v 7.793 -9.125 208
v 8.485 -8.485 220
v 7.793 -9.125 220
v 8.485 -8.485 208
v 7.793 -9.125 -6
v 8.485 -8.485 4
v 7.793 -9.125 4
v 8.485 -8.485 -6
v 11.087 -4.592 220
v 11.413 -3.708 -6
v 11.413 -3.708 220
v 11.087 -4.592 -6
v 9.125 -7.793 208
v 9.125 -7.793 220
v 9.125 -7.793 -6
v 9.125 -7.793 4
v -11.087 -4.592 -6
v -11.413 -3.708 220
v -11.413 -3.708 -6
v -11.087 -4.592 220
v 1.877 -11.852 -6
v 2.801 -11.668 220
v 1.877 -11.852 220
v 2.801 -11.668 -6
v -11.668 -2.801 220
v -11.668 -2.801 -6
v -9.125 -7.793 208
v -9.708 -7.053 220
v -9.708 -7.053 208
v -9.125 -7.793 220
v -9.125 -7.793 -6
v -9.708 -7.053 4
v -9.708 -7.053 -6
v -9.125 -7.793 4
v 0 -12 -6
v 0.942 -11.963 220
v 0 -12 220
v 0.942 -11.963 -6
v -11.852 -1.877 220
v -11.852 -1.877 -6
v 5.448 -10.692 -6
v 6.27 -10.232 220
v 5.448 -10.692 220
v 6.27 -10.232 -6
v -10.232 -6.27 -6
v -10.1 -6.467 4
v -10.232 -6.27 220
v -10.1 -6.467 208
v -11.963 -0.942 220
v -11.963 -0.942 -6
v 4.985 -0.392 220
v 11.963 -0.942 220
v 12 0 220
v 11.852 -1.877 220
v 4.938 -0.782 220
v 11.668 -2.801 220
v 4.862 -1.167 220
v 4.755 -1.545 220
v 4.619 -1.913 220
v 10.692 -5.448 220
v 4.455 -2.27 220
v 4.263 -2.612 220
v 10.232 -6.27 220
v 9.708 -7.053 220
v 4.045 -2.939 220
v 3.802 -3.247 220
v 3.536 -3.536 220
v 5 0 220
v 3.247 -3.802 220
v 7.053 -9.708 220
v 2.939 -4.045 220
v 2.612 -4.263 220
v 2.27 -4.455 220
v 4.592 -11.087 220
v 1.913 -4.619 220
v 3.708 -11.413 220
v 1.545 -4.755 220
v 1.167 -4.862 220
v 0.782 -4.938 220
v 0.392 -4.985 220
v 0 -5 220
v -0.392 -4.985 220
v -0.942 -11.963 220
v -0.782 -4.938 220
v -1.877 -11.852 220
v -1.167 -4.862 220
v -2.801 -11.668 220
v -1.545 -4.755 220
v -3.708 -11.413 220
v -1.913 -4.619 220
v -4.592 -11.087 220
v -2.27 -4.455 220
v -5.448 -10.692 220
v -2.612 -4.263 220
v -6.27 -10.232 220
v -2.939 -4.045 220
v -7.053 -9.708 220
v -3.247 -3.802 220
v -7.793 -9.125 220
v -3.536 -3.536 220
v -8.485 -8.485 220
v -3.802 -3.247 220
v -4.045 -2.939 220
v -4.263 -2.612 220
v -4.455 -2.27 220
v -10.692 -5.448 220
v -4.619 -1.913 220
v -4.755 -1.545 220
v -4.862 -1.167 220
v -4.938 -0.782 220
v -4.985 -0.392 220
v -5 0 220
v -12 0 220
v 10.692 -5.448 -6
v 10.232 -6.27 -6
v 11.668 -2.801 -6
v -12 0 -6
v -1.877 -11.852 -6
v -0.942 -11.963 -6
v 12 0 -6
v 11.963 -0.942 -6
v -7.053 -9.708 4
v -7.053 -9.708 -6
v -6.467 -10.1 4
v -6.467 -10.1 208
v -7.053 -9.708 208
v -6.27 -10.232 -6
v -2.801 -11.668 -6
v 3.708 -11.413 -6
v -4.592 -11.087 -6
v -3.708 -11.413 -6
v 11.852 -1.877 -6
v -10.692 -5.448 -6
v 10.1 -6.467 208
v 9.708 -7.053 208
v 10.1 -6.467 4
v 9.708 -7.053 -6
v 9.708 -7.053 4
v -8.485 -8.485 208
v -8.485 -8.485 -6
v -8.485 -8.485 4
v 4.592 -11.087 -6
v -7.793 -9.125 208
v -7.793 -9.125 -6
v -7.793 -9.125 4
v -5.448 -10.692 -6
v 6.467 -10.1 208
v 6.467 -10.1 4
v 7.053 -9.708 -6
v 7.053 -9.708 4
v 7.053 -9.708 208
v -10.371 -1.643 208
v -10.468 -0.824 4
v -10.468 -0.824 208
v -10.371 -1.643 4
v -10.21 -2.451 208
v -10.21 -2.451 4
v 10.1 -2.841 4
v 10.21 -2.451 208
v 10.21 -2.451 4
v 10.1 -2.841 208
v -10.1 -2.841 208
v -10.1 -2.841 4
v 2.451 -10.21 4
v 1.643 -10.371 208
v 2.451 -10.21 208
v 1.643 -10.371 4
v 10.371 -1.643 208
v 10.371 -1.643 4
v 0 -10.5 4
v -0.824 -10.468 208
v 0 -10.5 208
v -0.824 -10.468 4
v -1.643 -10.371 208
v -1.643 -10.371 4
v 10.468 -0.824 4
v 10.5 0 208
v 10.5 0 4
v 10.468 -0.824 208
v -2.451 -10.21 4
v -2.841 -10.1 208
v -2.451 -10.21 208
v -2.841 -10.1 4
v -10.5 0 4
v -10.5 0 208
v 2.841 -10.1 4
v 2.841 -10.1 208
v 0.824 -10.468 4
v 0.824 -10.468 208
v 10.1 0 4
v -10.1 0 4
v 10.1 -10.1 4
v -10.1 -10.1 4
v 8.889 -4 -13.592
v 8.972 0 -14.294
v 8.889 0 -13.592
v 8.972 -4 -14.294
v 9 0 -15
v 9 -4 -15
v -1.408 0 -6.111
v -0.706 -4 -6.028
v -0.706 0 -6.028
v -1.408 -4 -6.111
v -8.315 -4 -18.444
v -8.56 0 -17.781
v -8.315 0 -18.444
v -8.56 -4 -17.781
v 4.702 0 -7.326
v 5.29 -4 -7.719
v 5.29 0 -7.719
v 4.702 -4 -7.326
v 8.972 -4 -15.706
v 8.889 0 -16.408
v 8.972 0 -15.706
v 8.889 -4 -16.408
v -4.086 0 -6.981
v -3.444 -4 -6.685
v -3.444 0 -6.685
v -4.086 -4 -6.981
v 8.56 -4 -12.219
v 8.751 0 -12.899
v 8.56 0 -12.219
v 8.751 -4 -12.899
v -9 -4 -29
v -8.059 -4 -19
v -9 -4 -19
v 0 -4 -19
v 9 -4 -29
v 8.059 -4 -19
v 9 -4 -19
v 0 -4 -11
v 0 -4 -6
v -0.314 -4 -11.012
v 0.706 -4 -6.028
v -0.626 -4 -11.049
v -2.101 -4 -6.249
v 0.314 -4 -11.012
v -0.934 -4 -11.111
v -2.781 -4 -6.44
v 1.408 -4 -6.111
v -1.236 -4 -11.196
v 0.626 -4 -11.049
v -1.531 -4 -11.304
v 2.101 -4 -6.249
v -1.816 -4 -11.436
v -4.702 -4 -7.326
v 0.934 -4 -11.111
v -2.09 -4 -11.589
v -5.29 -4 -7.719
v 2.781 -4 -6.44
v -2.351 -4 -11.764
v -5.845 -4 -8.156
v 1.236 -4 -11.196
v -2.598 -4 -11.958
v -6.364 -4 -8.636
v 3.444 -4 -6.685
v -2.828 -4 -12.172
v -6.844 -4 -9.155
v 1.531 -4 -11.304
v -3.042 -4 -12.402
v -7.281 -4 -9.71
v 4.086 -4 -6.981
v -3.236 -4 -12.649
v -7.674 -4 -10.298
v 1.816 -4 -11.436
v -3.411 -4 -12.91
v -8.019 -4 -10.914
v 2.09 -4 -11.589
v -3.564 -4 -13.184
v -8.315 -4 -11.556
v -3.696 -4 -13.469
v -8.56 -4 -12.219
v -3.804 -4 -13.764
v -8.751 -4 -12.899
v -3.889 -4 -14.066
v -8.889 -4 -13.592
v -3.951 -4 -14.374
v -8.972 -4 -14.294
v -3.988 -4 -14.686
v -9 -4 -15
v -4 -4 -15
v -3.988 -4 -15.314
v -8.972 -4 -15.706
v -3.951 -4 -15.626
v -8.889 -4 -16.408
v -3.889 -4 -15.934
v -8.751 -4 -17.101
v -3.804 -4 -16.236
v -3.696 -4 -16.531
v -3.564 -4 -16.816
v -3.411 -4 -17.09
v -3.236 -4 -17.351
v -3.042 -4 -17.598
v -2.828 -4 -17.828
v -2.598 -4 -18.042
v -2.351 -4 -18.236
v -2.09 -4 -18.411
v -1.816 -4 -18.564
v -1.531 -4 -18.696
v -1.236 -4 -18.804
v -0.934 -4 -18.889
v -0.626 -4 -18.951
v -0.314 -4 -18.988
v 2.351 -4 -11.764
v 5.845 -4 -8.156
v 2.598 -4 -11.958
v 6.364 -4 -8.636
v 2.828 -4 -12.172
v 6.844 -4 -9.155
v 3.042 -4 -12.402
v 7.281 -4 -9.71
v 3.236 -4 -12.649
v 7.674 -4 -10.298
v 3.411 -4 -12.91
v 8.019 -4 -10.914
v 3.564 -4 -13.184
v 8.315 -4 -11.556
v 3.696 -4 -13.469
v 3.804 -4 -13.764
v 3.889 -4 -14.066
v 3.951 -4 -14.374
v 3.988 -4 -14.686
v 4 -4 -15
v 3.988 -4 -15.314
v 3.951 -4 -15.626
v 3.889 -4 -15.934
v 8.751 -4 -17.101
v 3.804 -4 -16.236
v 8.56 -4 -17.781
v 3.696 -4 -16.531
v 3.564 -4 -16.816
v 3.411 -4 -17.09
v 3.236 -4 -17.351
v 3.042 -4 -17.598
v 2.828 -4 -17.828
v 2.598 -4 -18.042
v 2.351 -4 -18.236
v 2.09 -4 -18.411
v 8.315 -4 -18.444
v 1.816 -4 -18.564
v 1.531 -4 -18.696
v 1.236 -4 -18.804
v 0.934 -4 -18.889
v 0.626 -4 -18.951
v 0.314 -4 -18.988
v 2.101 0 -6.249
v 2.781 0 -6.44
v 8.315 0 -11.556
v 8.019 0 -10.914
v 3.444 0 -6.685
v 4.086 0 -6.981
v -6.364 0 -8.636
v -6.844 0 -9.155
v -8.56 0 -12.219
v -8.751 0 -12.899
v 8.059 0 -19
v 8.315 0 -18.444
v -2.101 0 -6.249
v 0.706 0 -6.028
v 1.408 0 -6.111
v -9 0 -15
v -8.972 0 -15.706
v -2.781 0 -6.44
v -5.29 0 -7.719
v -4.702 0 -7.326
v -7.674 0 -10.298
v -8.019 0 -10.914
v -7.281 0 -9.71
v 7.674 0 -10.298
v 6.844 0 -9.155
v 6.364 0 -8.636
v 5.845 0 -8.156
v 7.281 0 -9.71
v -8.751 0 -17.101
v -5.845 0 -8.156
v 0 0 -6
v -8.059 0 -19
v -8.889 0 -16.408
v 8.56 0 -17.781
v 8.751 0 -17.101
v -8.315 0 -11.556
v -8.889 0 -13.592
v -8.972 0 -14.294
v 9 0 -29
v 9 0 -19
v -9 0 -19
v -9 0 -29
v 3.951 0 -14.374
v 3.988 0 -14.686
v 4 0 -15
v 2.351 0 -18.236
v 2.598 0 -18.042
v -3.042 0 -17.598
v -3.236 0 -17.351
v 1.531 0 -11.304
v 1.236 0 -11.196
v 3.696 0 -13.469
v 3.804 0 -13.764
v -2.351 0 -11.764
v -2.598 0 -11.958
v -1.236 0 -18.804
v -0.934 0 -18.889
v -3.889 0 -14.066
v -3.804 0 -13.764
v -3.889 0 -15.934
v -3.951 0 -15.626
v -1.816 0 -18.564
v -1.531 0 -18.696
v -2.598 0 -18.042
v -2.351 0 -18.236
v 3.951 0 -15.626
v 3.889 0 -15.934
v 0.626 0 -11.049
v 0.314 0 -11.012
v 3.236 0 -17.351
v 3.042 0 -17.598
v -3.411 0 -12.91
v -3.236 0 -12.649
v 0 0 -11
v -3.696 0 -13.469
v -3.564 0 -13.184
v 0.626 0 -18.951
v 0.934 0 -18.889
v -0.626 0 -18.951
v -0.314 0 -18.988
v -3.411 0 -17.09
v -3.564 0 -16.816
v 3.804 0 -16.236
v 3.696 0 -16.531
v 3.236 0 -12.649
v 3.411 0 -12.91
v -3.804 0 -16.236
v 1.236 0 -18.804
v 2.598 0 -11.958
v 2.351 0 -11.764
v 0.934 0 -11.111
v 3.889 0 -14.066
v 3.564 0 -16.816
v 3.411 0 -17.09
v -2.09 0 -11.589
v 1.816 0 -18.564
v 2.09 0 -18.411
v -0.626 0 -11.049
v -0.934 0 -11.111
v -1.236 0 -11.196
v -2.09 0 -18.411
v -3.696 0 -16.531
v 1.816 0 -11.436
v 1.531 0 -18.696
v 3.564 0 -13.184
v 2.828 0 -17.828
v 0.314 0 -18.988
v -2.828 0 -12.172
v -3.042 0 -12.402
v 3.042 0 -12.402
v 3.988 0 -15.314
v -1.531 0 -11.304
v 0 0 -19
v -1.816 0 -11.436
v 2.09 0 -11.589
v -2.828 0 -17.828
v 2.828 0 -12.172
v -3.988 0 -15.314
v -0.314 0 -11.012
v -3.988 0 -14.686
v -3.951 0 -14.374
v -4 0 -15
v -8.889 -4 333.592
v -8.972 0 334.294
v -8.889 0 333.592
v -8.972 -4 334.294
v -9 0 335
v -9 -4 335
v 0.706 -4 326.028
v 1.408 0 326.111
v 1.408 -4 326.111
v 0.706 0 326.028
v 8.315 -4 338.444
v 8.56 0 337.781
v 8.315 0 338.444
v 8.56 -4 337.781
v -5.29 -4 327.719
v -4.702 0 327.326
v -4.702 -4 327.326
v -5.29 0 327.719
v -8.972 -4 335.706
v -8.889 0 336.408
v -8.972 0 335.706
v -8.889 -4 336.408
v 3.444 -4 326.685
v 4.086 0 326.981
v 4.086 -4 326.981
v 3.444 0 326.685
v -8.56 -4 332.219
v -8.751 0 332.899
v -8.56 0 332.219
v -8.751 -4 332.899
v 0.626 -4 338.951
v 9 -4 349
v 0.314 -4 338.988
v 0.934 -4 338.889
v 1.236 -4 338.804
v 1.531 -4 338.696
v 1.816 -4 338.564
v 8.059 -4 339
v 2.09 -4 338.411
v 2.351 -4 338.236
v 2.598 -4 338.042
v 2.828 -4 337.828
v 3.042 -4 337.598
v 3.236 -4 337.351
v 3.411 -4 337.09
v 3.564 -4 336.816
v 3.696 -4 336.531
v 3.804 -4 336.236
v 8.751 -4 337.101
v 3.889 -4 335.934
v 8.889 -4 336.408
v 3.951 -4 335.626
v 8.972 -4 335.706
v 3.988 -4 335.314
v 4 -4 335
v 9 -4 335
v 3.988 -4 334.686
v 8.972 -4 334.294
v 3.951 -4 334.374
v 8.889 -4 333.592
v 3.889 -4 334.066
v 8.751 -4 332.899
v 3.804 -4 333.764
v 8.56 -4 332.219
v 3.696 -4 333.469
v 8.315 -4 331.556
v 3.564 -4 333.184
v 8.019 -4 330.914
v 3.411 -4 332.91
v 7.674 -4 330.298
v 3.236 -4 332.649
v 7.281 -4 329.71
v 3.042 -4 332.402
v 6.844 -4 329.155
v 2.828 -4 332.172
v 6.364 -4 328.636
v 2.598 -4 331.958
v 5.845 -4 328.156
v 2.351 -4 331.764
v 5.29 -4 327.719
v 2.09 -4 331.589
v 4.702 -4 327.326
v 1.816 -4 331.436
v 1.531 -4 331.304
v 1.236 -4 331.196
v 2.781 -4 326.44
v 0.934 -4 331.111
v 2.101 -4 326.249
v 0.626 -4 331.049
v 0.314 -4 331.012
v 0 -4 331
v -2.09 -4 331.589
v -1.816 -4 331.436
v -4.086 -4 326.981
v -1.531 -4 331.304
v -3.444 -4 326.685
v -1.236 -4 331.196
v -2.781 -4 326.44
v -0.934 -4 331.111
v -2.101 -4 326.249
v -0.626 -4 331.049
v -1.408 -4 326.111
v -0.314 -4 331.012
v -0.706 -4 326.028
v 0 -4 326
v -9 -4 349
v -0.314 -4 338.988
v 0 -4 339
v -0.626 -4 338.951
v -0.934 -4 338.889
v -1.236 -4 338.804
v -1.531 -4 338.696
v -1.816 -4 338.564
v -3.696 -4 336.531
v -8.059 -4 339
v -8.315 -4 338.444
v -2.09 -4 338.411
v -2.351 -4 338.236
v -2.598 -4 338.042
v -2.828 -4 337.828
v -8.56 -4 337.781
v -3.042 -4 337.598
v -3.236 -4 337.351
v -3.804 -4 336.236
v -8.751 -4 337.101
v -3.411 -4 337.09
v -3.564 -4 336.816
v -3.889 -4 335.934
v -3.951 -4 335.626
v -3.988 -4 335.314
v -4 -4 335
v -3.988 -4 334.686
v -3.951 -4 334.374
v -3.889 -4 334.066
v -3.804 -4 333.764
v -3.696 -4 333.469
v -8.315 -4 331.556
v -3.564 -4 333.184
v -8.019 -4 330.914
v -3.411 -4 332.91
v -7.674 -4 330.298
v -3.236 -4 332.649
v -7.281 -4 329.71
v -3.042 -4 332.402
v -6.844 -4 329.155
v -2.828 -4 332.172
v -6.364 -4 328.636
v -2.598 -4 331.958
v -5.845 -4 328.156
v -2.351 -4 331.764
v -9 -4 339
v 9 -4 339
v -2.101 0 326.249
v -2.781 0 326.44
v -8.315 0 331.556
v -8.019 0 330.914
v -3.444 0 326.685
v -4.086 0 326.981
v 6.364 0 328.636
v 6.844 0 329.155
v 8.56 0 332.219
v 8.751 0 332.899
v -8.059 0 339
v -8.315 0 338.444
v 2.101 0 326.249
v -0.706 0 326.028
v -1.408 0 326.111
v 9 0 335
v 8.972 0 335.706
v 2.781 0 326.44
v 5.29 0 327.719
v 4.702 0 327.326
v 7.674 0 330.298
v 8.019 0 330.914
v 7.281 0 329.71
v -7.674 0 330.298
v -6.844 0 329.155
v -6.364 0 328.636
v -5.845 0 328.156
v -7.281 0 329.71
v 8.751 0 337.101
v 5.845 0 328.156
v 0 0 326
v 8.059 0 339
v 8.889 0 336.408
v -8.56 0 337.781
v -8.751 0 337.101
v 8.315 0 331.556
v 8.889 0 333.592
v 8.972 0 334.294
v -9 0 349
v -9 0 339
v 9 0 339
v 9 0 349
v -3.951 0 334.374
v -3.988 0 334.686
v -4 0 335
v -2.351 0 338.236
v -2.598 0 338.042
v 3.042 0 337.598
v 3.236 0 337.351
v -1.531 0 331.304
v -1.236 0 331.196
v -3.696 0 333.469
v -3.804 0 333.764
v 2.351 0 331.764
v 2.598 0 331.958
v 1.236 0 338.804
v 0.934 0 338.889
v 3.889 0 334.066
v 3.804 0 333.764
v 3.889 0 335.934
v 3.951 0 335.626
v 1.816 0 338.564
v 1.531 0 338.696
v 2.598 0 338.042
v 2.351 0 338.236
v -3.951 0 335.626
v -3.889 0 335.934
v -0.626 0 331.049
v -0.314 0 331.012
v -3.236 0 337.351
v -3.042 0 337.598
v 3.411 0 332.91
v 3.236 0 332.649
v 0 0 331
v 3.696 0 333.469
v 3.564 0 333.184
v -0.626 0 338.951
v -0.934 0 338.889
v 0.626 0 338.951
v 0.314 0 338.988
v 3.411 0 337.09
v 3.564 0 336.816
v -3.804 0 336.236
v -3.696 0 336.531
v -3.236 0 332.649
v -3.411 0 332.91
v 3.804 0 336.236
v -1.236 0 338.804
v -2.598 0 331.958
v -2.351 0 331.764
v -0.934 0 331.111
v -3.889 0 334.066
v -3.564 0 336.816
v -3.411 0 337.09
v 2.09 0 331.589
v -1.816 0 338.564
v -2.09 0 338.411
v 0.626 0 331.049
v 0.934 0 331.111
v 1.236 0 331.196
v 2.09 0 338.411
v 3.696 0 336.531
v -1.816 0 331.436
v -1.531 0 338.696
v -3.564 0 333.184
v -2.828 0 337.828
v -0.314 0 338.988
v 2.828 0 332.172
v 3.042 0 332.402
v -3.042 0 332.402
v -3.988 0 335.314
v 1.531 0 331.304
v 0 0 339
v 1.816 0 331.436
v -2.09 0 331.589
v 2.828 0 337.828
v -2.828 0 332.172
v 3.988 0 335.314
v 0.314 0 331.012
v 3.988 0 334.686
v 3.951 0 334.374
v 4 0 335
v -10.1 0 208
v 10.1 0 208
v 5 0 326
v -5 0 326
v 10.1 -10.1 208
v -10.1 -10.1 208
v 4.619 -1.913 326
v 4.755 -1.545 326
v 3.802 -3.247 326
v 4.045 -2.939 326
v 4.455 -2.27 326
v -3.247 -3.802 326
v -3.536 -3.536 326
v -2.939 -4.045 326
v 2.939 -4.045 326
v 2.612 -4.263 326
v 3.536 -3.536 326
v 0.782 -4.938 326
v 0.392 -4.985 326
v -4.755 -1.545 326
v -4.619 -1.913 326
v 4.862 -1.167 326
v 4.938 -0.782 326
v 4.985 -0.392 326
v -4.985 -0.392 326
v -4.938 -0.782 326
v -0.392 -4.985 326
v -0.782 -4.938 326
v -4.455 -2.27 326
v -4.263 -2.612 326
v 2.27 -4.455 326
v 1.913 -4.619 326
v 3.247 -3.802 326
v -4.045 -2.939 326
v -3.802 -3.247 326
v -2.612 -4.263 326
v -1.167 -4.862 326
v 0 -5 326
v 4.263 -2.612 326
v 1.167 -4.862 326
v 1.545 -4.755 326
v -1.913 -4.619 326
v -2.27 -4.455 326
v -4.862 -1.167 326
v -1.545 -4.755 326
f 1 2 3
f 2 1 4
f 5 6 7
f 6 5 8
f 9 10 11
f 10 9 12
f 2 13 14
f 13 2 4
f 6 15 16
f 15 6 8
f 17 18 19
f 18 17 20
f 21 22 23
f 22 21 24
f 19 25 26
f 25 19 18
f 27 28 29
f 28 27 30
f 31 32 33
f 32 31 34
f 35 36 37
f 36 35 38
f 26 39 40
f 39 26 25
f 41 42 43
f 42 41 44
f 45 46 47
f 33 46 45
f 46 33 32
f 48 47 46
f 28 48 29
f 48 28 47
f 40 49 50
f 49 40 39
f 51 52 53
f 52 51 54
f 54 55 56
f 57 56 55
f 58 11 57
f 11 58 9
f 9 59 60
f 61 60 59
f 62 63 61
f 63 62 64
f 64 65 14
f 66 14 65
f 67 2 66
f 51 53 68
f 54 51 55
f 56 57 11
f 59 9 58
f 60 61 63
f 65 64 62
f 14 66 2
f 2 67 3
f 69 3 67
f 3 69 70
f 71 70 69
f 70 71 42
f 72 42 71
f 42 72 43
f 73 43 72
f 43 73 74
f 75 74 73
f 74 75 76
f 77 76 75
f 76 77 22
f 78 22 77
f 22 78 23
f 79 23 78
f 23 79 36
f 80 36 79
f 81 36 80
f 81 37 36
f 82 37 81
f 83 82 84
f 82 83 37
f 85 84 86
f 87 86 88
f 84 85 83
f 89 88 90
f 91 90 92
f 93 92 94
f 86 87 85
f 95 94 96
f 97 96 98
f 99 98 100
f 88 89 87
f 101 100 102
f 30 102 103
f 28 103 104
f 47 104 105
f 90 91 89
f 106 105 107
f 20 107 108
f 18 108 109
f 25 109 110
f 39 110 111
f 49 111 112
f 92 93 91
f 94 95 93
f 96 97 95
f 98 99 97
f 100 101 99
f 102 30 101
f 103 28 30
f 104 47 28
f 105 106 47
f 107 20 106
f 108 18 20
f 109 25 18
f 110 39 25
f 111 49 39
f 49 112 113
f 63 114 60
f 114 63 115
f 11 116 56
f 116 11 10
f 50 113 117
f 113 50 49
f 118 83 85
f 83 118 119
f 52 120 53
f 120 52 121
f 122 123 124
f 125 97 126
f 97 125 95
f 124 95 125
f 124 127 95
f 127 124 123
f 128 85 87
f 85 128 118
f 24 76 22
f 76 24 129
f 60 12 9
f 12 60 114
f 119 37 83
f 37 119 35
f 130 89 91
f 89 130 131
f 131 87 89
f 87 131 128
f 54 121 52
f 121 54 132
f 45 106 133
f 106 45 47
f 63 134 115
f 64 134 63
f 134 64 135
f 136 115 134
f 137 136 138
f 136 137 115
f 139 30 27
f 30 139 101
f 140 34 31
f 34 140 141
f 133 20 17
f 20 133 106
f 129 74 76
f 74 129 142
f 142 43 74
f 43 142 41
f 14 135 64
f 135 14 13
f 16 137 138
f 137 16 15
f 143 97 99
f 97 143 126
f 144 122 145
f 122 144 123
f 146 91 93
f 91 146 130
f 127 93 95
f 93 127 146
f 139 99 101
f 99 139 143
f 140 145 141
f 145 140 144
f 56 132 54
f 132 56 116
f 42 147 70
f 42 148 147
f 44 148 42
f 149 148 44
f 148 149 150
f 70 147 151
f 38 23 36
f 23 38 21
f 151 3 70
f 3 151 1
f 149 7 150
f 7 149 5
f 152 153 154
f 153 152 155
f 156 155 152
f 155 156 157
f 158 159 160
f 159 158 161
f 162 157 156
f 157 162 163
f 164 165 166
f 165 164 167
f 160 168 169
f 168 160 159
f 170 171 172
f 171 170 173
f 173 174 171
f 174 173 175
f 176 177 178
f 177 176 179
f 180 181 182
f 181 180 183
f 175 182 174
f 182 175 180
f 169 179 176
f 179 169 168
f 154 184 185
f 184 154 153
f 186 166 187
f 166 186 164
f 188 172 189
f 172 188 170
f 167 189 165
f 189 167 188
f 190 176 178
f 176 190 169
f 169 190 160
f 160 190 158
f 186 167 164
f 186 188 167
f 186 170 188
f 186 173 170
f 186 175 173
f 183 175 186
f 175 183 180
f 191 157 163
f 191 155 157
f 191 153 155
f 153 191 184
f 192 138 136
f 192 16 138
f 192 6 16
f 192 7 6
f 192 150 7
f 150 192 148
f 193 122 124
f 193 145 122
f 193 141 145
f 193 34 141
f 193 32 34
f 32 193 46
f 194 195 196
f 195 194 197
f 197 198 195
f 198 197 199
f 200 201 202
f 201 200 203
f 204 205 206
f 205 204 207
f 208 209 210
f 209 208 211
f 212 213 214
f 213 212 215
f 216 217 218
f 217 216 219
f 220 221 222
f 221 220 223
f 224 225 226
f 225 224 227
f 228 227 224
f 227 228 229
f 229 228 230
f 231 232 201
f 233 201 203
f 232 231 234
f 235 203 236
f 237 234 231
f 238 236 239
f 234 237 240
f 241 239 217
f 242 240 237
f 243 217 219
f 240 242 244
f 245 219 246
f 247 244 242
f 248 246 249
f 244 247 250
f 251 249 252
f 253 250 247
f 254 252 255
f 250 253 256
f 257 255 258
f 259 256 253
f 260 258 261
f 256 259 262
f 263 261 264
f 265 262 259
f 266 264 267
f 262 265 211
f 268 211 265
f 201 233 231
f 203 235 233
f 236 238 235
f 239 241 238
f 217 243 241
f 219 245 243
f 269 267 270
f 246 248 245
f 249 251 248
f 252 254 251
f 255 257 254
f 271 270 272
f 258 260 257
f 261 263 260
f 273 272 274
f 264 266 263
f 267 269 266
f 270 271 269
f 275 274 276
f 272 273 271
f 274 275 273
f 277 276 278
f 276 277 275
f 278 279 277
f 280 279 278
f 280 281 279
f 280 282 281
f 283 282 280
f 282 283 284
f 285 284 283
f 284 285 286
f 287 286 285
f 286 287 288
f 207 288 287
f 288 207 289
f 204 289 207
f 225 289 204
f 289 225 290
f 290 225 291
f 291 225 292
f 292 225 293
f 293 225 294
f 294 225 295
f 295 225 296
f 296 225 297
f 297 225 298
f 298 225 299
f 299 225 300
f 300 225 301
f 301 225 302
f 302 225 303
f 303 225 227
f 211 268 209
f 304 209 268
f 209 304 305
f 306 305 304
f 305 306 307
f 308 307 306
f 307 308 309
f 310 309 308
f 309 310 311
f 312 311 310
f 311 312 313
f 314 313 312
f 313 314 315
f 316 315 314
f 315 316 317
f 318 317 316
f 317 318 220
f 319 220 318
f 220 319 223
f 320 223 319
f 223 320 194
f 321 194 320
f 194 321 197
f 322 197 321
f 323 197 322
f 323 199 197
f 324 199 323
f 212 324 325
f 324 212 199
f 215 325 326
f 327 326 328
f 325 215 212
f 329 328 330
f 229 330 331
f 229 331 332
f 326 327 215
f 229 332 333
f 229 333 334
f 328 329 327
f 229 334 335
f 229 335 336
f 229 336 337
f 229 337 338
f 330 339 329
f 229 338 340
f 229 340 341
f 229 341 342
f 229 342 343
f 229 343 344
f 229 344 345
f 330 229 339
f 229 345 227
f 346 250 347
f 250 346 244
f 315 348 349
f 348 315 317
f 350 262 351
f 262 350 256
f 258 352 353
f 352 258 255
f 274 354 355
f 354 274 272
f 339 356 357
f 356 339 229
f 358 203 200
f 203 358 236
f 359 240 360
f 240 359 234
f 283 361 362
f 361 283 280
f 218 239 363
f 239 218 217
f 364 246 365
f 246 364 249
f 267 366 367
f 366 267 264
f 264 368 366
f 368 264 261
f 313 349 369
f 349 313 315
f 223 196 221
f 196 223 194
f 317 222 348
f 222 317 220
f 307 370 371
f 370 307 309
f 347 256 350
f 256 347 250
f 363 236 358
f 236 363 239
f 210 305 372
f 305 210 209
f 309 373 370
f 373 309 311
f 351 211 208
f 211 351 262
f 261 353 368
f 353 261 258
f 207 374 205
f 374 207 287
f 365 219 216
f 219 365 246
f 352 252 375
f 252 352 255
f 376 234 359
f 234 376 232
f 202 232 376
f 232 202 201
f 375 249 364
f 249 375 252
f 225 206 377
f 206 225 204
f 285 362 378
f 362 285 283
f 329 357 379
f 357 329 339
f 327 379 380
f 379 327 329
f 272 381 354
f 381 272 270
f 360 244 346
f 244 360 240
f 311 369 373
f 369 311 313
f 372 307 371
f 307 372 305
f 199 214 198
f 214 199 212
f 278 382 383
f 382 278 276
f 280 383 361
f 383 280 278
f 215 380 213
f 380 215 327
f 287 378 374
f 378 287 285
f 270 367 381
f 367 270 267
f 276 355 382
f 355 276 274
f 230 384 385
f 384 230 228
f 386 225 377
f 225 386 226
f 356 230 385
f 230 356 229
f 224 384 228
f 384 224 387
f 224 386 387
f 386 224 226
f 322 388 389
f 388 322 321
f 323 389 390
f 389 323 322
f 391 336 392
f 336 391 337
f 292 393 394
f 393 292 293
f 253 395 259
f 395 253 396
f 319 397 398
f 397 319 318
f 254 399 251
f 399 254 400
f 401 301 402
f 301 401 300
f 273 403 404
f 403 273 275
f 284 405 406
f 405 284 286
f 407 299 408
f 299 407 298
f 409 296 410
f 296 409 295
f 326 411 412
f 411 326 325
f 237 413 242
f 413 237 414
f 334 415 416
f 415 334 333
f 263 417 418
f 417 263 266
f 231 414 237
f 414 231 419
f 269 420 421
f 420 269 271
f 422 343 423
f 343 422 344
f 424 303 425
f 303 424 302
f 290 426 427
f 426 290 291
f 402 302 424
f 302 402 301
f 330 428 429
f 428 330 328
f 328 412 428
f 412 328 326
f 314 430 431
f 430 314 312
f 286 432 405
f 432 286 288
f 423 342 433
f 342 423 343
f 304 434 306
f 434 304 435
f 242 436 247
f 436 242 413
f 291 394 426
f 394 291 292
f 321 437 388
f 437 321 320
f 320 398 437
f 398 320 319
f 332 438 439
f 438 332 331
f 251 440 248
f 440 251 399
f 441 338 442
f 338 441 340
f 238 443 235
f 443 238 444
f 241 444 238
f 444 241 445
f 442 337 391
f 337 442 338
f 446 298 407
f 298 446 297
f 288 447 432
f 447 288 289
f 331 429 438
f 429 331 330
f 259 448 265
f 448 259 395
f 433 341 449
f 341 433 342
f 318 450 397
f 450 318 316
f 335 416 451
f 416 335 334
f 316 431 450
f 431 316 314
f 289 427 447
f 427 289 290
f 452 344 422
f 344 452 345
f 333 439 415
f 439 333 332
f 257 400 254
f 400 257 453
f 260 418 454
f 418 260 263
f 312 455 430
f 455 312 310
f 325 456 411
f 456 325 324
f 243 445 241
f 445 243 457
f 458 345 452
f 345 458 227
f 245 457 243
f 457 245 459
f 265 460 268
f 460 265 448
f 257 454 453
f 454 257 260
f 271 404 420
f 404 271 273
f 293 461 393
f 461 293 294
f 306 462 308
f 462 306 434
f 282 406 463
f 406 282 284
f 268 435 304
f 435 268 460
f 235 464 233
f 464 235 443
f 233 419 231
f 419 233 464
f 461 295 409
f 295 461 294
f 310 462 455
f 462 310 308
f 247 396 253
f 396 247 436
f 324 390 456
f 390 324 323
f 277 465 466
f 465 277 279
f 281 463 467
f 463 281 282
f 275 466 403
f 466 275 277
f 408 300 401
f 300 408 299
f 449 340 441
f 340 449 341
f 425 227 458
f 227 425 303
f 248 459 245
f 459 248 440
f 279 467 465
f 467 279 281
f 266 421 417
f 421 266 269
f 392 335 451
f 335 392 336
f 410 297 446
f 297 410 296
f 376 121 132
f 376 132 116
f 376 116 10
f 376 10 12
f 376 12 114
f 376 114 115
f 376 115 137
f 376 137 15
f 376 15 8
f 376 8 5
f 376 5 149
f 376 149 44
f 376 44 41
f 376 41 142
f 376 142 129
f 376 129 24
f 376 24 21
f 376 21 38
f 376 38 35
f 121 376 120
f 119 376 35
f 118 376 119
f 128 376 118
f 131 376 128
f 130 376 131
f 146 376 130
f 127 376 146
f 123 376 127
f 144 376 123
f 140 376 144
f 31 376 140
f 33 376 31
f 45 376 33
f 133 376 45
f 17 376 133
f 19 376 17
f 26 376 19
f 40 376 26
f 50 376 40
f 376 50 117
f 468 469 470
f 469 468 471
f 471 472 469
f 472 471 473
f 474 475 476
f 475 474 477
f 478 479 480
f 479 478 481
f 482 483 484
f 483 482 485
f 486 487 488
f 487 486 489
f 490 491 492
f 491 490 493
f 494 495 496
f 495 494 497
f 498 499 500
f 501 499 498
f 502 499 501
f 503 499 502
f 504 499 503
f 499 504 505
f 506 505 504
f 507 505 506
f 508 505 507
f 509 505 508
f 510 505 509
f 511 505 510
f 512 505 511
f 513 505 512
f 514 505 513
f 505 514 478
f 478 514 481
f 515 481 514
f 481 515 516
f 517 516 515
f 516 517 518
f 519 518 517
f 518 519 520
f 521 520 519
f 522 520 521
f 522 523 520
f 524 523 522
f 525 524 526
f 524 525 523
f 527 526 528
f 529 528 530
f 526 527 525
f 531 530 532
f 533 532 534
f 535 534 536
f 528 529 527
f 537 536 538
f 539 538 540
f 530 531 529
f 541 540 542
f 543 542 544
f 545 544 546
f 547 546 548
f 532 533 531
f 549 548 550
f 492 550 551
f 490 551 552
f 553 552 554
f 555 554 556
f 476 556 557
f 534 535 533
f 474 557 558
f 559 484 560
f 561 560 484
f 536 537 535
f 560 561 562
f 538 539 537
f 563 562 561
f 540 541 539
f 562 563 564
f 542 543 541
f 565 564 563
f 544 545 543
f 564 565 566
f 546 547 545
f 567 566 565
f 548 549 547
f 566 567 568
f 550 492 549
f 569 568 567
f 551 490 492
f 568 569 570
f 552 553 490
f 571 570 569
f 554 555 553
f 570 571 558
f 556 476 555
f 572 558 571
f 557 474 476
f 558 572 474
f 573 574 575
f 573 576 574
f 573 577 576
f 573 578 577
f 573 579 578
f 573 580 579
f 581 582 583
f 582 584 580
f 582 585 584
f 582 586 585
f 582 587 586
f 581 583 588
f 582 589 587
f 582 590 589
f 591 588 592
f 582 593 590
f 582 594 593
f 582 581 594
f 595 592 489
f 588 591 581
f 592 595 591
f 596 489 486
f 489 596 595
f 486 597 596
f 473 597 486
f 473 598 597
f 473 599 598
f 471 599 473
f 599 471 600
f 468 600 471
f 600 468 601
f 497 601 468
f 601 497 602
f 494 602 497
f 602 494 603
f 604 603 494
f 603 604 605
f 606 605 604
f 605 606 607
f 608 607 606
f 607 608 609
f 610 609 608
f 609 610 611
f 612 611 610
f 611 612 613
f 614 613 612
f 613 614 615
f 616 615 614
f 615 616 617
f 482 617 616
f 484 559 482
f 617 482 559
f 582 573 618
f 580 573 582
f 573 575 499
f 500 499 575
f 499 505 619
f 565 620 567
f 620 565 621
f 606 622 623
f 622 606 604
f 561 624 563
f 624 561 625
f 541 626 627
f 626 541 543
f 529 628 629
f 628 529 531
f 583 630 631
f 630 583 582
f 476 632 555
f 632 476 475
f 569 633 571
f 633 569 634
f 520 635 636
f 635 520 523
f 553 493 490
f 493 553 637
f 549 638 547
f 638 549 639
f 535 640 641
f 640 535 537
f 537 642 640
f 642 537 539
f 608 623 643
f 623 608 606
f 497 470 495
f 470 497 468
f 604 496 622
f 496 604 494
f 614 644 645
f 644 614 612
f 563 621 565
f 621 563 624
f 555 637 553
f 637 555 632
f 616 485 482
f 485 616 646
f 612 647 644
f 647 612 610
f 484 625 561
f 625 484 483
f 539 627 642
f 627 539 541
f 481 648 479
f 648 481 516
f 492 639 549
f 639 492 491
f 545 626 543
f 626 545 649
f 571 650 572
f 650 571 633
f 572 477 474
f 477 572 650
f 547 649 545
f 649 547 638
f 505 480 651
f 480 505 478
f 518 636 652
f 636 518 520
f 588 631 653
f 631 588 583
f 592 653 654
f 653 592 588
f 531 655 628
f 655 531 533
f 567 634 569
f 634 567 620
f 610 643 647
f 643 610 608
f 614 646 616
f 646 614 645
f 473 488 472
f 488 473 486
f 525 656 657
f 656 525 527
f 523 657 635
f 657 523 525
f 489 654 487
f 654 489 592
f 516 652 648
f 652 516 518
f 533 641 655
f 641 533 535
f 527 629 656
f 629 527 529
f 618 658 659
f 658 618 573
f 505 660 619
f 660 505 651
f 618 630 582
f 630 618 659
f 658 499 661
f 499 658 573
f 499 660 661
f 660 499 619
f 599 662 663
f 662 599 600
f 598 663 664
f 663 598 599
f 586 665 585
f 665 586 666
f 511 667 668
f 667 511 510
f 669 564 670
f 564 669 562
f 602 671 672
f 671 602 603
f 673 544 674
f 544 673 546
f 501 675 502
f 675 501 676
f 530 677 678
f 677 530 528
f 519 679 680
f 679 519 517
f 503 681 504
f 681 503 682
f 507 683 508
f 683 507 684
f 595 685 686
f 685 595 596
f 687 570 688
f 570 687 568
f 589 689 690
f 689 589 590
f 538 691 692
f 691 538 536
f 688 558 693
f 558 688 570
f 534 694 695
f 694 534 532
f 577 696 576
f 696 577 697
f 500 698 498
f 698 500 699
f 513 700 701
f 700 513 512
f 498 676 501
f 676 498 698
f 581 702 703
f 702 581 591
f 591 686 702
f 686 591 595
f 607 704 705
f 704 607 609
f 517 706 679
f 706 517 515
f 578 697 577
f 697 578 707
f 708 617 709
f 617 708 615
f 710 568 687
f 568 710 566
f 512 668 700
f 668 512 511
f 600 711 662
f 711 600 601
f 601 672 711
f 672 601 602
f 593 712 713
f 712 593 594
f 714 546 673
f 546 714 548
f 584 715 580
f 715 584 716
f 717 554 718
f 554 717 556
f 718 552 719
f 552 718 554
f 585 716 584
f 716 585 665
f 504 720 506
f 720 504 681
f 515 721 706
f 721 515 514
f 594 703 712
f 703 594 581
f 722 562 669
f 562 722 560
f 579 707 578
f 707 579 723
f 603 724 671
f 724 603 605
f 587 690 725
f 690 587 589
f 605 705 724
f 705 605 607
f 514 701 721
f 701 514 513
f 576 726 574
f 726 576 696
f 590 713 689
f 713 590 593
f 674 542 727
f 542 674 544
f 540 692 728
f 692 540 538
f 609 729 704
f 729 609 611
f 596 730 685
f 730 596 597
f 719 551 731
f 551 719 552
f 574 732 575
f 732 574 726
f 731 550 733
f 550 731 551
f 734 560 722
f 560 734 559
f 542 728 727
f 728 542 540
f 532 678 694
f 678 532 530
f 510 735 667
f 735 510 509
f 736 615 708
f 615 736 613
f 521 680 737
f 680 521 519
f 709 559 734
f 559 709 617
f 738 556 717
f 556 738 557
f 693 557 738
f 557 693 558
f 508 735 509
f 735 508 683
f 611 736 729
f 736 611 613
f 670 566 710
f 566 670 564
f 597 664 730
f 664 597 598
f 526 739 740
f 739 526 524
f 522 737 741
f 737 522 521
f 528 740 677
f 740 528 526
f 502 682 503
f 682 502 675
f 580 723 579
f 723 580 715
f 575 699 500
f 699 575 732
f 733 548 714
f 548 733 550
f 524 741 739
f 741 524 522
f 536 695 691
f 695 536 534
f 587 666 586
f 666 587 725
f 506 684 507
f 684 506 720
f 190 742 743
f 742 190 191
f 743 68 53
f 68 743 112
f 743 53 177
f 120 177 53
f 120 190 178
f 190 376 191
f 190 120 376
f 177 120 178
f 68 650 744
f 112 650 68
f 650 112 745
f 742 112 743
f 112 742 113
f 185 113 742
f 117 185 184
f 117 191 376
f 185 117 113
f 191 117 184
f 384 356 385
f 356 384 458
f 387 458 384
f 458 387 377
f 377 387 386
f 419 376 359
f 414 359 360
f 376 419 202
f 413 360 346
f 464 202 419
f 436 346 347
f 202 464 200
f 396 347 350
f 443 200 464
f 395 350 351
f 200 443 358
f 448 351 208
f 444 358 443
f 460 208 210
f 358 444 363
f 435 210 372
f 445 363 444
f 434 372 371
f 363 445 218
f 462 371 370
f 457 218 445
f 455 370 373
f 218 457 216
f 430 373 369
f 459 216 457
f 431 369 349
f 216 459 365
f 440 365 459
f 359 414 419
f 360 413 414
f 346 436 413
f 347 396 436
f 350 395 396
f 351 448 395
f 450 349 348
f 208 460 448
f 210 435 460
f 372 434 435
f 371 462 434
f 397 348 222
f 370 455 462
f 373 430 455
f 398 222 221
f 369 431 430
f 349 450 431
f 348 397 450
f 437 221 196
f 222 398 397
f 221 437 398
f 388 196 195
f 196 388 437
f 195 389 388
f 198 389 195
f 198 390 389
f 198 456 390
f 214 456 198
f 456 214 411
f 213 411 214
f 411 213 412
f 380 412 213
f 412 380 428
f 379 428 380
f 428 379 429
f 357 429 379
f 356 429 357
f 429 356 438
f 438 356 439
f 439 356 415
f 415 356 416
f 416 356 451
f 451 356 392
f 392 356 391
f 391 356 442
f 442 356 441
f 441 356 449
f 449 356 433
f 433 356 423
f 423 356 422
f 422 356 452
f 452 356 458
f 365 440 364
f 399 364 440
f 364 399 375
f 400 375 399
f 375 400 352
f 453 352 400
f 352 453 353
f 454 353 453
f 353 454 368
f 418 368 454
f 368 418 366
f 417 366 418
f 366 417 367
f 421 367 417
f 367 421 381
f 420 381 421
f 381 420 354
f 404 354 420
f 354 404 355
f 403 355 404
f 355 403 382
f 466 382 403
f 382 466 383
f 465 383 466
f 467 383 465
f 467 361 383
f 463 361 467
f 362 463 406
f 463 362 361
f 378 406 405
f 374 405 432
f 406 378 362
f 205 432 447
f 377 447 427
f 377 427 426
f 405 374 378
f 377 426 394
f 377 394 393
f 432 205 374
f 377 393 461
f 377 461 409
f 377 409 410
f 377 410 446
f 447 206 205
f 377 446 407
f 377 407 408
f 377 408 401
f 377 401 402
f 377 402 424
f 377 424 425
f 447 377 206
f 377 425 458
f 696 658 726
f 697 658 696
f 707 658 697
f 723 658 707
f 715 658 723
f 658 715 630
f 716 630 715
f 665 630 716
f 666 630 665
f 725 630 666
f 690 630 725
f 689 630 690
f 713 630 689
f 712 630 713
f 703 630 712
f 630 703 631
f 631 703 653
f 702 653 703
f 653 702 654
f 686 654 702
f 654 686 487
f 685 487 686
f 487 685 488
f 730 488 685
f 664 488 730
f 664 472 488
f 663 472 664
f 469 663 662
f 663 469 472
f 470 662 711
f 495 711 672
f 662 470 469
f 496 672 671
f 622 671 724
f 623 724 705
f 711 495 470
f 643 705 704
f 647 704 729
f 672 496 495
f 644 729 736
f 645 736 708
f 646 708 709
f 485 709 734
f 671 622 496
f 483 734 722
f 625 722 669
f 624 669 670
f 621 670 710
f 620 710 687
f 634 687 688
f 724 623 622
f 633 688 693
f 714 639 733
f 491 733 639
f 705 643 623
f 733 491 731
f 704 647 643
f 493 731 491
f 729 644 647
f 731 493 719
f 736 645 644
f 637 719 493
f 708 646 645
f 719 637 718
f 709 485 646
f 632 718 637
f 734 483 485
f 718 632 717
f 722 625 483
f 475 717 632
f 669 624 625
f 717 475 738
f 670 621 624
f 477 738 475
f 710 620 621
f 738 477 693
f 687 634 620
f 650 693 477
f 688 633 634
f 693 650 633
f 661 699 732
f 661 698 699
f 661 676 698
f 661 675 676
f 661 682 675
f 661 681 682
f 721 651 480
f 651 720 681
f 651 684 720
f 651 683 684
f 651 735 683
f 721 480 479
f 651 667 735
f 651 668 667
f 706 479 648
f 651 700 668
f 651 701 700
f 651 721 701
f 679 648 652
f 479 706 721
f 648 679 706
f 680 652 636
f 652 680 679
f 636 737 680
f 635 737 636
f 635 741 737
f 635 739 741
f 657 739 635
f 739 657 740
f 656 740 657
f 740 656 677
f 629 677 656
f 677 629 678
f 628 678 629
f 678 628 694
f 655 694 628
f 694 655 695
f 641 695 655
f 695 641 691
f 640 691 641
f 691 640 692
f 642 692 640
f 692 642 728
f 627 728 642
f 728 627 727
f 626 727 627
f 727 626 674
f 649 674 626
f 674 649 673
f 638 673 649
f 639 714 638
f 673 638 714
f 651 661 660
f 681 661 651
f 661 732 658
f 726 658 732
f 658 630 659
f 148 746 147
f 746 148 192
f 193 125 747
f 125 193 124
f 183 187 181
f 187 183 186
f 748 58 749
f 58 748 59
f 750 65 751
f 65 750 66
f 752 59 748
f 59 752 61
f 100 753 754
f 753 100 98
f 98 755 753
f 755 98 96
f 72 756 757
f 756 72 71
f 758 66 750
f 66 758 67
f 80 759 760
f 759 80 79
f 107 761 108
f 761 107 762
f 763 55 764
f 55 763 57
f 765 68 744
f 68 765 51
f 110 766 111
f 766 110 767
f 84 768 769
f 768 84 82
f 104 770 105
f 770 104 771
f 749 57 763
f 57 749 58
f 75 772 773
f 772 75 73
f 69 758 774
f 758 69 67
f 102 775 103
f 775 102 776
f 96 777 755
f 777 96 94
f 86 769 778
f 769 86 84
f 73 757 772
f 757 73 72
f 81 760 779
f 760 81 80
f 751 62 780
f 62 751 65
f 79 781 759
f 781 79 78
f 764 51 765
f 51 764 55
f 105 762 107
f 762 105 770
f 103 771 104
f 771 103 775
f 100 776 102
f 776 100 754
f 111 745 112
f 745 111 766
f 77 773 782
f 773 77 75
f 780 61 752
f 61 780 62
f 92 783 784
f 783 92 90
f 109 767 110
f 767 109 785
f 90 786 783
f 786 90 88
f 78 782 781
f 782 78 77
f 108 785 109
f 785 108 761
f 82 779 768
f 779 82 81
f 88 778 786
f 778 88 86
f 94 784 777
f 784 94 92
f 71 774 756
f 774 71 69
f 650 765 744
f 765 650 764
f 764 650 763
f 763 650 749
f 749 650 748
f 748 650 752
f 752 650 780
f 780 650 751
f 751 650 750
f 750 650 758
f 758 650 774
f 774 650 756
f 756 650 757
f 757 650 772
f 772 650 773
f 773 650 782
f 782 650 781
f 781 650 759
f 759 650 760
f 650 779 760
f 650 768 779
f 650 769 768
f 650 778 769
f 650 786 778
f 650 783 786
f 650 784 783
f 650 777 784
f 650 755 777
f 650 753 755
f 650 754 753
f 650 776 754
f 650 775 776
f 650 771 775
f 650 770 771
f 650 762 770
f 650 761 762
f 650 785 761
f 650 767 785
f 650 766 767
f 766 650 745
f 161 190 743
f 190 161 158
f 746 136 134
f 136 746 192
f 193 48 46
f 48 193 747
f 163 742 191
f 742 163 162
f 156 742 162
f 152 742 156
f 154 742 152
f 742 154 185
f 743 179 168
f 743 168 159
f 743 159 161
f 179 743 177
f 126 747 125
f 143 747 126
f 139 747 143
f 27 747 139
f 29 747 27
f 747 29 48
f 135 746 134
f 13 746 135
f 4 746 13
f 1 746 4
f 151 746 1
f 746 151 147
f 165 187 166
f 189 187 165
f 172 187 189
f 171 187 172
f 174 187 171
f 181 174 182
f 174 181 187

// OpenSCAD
// ============================================================
//  OpenOmni - Resorte de gas (gas strut) PARAMÉTRICO
//  Modela el muelle neumático real + un CORTE que explica
//  cómo funciona por dentro. Unidades: mm.
//
//  part:
//   "assembly"  -> strut completo, extendido
//   "section"   -> MEDIO CORTE que revela el interior (educativo)
//   "compressed"-> corte con el vástago comprimido (gas comprimido)
//   "mount"     -> abrazadera impresa + ojal de acero (cómo se fija)
// ============================================================
part = "section";

// ---------- parámetros ----------
Lb      = 220;   // largo del cuerpo (tubo)
OD      = 24;    // diámetro exterior del cuerpo
wall    = 1.5;   // pared del tubo
ID      = OD-2*wall;
rod_d   = 10;    // diámetro del vástago
stroke  = 120;   // carrera del vástago
eye_od  = 18;    // ojal de montaje (exterior)
eye_bore= 8;     // perno M8
eye_th  = 8;     // espesor del ojal
$fn     = 80;

ext = (part=="compressed") ? 0.25 : (part=="section" ? 0.55 : 1.0);

// ------------------------------------------------------------
module eye(){                      // ojal de montaje con bore para perno
    difference(){
        union(){
            rotate([90,0,0]) cylinder(d=eye_od,h=eye_th,center=true);
            translate([0,0,-eye_od/2]) cube([eye_od,eye_th,eye_od/2+1],center=true);
        }
        rotate([90,0,0]) cylinder(d=eye_bore,h=eye_th+2,center=true);
    }
}

module strut(ext=1, cut=false){
    rod_out  = 40 + ext*stroke;              // cuánto sobresale el vástago
    pistonZ  = 20 + (Lb-55)*ext;             // pistón: alto si extendido, bajo si comprimido
    difference(){
        union(){
            // --- cuerpo: tubo de acero (hueco) + tapa inferior ---
            color("silver"){
                difference(){ cylinder(d=OD,h=Lb); translate([0,0,4]) cylinder(d=ID,h=Lb); }
                translate([0,0,-6]) cylinder(d=OD,h=8);
                translate([0,0,-6-eye_od/2]) eye();                 // ojal del cuerpo
            }
            // --- INTERIOR: como BLOQUES en la mitad y<0 (cara plana en y=0, sin z-fighting) ---
            gd = ID-0.8;                                   // ancho de las cámaras
            // gas N2 a presión (bajo el pistón)
            color([0.25,0.55,1.0]) translate([0,-gd/4,(4+pistonZ)/2]) cube([gd, gd/2, pistonZ-4], center=true);
            // pistón (émbolo con sello)
            color("black") translate([0,-gd/4,pistonZ+4.5]) cube([gd, gd/2, 9], center=true);
            // aceite (amortiguación, sobre el pistón)
            color([0.95,0.55,0.10]) translate([0,-gd/4,(pistonZ+9+Lb-12)/2]) cube([gd, gd/2, Lb-12-(pistonZ+9)], center=true);
            // orificio de paso del pistón (aceite -> amortiguación viscosa)
            color("yellow") translate([rod_d/2+2,-gd/4,pistonZ+4.5]) cube([2,gd/2,9], center=true);
            // --- vástago (unido al pistón, sale por arriba) ---
            color("gainsboro"){
                translate([0,-gd/4,(pistonZ+9+Lb)/2]) cube([rod_d, gd/2, Lb-(pistonZ+9)], center=true); // tramo interno
                translate([0,0,Lb]) cylinder(d=rod_d, h=rod_out);               // tramo externo
                translate([0,0,Lb+rod_out+eye_od/2]) rotate([0,180,0]) eye();   // ojal del vástago
            }
            // guía/sello superior del cuerpo
            color("dimgray") translate([0,0,Lb-12]) cylinder(d=OD-0.5, h=12);
        }
        if(cut) translate([0,OD,Lb/2]) cube([OD*3, OD*2, Lb*4], center=true);   // medio corte (quita y>0)
    }
}

// ---------- abrazadera impresa + ojal de acero (cómo se fija al brazo) ----------
module mount(){
    tube=32;               // tubo del brazo Ø32
    color("orange")
    difference(){
        union(){ cube([tube+16, tube+16, 22], center=true);
                 translate([0,-(tube+16)/2-3,0]) cube([tube+16,8,22],center=true); }
        cylinder(d=tube+0.4, h=30, center=true);                       // socket del tubo (+0.4 tol. FDM)
        cube([1.4, tube+24, 24], center=true);                         // ranura del split-clamp
        for(z=[-7,7]) translate([tube/2+5,-tube/2-3,z]) rotate([0,90,0]) cylinder(d=5.2,h=24,center=true); // pernos clamp M5
        rotate([90,0,0]) cylinder(d=8.2, h=tube+40, center=true);      // PERNO M8 pasante (el que aguanta)
    }
    color("dimgray") eye();                                            // ojal de acero del strut en el perno
}

// ---------- selector ----------
if(part=="assembly")        strut(1,false);
else if(part=="section")    strut(ext,true);
else if(part=="compressed") strut(ext,true);
else if(part=="mount")      mount();
